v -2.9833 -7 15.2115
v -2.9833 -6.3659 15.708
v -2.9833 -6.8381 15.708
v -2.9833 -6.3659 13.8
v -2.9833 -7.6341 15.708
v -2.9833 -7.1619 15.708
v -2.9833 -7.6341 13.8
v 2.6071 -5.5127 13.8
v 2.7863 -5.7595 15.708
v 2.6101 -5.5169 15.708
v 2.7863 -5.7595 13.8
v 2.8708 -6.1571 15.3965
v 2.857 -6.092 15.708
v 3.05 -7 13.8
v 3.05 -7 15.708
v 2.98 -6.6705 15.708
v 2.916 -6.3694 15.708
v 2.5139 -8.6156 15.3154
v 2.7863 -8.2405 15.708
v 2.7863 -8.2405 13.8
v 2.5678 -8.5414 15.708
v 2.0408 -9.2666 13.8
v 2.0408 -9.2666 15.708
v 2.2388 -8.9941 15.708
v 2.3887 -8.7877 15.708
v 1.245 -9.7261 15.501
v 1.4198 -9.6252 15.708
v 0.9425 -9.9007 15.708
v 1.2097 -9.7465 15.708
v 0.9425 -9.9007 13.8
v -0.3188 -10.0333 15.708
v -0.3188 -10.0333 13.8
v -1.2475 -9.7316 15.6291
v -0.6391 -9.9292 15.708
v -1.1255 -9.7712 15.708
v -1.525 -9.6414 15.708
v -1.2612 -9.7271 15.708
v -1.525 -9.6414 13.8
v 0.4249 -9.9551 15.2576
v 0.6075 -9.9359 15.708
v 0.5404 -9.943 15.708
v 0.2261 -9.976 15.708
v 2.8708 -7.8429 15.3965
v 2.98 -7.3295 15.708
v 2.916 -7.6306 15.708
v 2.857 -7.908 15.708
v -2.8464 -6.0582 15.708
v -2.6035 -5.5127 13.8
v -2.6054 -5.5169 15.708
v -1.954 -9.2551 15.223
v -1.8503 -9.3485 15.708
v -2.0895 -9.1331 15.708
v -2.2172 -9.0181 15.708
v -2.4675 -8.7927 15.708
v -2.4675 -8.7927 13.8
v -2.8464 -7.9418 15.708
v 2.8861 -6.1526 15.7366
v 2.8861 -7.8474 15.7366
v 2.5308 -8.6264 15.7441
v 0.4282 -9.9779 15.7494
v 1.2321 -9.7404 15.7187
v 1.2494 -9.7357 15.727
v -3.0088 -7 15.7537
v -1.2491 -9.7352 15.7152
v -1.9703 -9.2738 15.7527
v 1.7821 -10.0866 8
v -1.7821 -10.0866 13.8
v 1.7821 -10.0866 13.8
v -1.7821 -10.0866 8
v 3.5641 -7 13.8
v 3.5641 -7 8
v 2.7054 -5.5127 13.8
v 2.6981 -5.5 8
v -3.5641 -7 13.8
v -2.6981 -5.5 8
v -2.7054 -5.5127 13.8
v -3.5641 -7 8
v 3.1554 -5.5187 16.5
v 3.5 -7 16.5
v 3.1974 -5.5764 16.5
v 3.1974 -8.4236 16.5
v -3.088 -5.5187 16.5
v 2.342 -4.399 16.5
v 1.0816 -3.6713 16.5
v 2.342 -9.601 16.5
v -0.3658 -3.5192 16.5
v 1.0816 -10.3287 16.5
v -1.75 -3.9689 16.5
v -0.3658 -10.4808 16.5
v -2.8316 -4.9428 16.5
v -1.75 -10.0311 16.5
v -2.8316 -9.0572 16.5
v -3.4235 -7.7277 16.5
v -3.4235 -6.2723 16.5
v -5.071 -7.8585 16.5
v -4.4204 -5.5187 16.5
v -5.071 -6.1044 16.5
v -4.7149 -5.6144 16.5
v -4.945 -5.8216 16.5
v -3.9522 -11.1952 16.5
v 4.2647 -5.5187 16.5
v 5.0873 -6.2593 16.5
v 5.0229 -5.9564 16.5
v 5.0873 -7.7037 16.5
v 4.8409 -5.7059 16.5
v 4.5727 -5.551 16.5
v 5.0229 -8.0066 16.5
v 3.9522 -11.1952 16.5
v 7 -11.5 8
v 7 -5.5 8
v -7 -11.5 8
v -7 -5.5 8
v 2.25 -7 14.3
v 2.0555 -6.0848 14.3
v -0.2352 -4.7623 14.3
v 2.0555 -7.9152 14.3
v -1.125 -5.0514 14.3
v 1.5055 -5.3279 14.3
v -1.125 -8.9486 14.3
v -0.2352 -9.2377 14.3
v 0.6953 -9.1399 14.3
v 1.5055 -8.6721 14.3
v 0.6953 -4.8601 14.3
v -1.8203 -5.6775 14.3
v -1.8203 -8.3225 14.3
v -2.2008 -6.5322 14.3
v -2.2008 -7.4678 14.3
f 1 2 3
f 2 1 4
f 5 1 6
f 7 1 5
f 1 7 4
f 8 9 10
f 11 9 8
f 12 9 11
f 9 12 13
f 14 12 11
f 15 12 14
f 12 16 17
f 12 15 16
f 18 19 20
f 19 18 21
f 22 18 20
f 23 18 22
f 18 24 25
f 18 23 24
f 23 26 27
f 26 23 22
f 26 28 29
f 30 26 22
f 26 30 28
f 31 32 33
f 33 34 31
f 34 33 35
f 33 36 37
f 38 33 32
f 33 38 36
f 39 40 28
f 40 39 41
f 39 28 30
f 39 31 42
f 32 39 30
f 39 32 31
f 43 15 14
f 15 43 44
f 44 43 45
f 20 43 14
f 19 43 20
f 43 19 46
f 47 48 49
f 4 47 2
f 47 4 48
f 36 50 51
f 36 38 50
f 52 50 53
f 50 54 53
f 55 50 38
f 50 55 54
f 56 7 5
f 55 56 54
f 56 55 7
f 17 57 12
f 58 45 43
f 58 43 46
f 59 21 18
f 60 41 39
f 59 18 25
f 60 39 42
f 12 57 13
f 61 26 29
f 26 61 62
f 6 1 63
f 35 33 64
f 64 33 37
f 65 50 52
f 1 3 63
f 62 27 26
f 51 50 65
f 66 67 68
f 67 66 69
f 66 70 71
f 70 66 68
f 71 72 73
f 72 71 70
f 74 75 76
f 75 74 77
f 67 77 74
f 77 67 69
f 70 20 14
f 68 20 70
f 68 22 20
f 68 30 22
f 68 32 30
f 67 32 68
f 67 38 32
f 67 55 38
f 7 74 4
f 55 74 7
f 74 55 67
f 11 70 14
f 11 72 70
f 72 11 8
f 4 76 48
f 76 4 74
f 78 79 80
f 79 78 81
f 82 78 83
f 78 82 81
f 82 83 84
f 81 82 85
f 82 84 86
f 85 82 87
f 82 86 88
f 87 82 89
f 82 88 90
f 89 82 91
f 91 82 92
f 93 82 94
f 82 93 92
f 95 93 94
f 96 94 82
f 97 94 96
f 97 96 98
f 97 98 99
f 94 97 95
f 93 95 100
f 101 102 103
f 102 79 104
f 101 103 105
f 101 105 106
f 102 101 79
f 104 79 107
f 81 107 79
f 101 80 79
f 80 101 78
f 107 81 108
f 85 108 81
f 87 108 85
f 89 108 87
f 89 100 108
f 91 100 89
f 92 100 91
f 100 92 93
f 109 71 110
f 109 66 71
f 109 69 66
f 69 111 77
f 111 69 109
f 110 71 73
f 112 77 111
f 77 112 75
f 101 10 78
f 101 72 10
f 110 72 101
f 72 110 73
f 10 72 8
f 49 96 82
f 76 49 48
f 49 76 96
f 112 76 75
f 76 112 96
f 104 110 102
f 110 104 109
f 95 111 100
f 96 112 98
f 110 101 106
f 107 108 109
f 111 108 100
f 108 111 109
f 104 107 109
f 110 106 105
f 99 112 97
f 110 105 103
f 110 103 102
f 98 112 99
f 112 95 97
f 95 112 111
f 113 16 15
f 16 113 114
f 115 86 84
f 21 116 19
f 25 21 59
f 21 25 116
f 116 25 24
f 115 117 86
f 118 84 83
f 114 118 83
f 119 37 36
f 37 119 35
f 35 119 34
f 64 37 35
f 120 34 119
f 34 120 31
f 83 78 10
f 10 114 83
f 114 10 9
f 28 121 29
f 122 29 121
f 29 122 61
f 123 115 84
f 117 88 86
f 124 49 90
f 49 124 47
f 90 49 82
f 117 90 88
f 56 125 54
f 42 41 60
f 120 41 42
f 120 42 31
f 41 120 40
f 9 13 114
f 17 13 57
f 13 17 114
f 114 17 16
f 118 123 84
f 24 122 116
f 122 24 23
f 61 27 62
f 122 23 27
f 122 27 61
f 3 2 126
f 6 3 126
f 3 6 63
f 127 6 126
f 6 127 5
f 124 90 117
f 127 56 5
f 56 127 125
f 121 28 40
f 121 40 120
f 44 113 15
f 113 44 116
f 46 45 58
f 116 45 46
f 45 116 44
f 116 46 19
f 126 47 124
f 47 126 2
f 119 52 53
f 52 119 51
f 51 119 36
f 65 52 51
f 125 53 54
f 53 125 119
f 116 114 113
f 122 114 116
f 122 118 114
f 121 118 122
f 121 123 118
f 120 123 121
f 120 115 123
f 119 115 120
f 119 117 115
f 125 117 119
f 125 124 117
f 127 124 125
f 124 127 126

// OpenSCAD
// file: util.scad
module pairX(d) for(a=[-d,d]) translate([a,0,0]) children();
module pairY(d) for(a=[-d,d]) translate([0,a,0]) children();
module pairZ(d) for(a=[-d,d]) translate([0,0,a]) children();

module mirrorX(d=0) { translate([d,0,0]) children();
    mirror([1,0,0])   translate([d,0,0]) children(); }
module mirrorY(d=0) { translate([0,d,0]) children();
    mirror([0,1,0])   translate([0,d,0]) children(); }
module mirrorZ(d=0) { translate([0,0,d]) children();
    mirror([0,0,1])   translate([0,0,d]) children(); }


//nanoSwitch();
NanoSwitchOffset = 1.8;  // center of switch to center of trigger
module nanoSwitch() { 
    difference () {
        translate([0,0,3.2]) cube([12.7,5.7,6.4],center=true); 
        #translate([0,0,5.7]) rotate([90,0,0])
            pairX(3) cylinder(d=2,h=8,$fn=16,center=true);
    }
    #for (d=[-5.25,0,5.25]) translate([d,0,6.3]) cube([.5,.5,4]);
    #translate([NanoSwitchOffset,0,-.5]) cube([1,2.8,1],center=true);
}
module fan40() difference() {
    hull() pairX(16) pairY(16) cylinder(r=4, h=10,$fn=36);
    translate([0,0,-1]) {
       pairX(16) pairY(16) cylinder(r=1.5,h=12,$fn=24);
    //pairX(16) pairY(16) cylinder(d=3,h=11,center=true,$fn=24);
       cylinder(d=38,h=12,$fn=48);
    }
}
module fan30() difference() {  // labeled 3007, but 8mm thick!
    translate([0,0,4]) cube([30,30,8],center=true);
    translate([0,0,-1]) {
       pairX(12) pairY(12) cylinder(r=1.5,h=12,$fn=24);
    //pairX(16) pairY(16) cylinder(d=3,h=11,center=true,$fn=24);
       cylinder(d=28,h=12,$fn=48);
    }
}
module fan3010() difference() {  // labeled 3007, but 8mm thick!
    translate([0,0,5]) cube([30,30,10],center=true);
    translate([0,0,-1]) {
       pairX(12) pairY(12) cylinder(r=1.5,h=12,$fn=24);
    //pairX(16) pairY(16) cylinder(d=3,h=11,center=true,$fn=24);
       cylinder(d=28,h=12,$fn=48);
    }
}

module fan30holes(r=1.5,h=40) translate([0,0,-1]) {
    #pairX(12) pairY(12) cylinder(r1=r+.15,r2=r-.2,h=h,$fn=24);
    cylinder(d=27,h=h,$fn=64);
    translate([0,0,-5]) cube([30,30,10],center=true);
}
module fan30mount(h=20) { %translate([0,0,-10]) fan3010();
    difference() {
        union() {
            for(a=[45:90:355]) rotate(a) translate([12*sqrt(2),0,0]) hull() {
                cylinder(r=4,h=4,$fn=RES/2);
                translate([-6,0,4]) cube([1,12,8],center=true);
            }
            cylinder(r=15,h=h,$fn=RES*1.5);
        }
        translate([0,0,3]) pairX(12) pairY(12) cylinder(d=5.5,h=6,$fn=RES/2);
        translate([0,0,-1]) {
            pairX(12) pairY(12) cylinder(r=1.6,h=12,$fn=RES/2);
            cylinder(d=27,h=h+2,$fn=RES*1.5);
        }
    } 
           
}
module fan40mount(h=20) { %translate([0,0,-10]) fan40();
    difference() {
        union() {
            for(a=[45:90:355]) rotate(a) translate([16*sqrt(2),0,0]) hull() {
                cylinder(r=4,h=4,$fn=RES/2);
                translate([-6,0,4]) cube([1,12,8],center=true);
            }
            cylinder(r=20,h=h,$fn=RES*1.5);
        }
        translate([0,0,3]) pairX(16) pairY(16) cylinder(d=5.5,h=6,$fn=RES/2);
        translate([0,0,-1]) {
            pairX(16) pairY(16) cylinder(r=1.6,h=12,$fn=RES/2);
            cylinder(d=37,h=h+2,$fn=RES*1.5);
        }
    } 
           
}

/* $Id$
$Log$
*/
// main file
// test/prototype for a kinematic mount, to be used to
// carry a hot-end/nozzle probe combo
RES=30;   // make larger for production  render

use <util.scad>;

PosSwitchMag = [0,-3.1,-0.2];

//%import("switchMount1.stl");
//%translate([0,-4.9,7.05]) import("switchMountRx1.stl");

%switchMount();  // true for proxy in glue jig

//magMountJig();

MagCenterY = -7;
MagZ = 11.5;
MountX = 14;
EffZ = 7;  // bottom of effector level

//translate([0,-MagCenterY,-4.5])
switchMountRx(true);  // true == proxy for glue jig

// mostly just for testing.  Production use, this
// assembly is added to effector, then at end
// holes are dirlled
module switchMountRx(proxy=false) difference() union() {
    difference() {
        switchMountRxBody();
        switchMountRxHoles();
            
        if (proxy) {
            // make top flat for possible clamp
            translate([-10,-15,16.5]) cube(20);
            // make sure bottom does not quite touch mount
            translate([-10,-15,-12]) cube(20);
        }
    }
        
    if (proxy) translate([0, MagCenterY,EffZ+7.3])
        cylinder(d1=4.5,d2=7,h=2.2,$fn=RES/2);
}

// flat area for clamp on mount
//difference() { translate([0,MagCenterY,2]) cube([16,16,5],center=true);  scale(1.02) #switchMount(); }

// plunger to mount magnet in effector
//union() { cylinder(d2=5.7,d1=5,h=11,$fn=RES); cylinder(r1=5,r2=2,$fn=6,h=4); }

// plug for when switch not in place
//translate([0,0,EffZ+1])
//difference() { cylinder(d1=6/cos(30),d2=6/cos(30)-.2,$fn=6,h=6);
//    translate([0,0,4]) cylinder(d=6,h=4,$fn=RES);
//    cylinder(d1=3.1,d2=2.8,h=8,$fn=16); }

module mountEdge() translate([0,-4.25,EffZ-1.25])
    pairX(MountX/2-1) sphere(d=2.5,$fn=RES/2);

module switchMount(proxy=false) { %nanoSwitch();
    difference() {
        union() {
            // magnet post
            translate([0,MagCenterY,EffZ-.1])
                cylinder(r=3/cos(30)-.05,h=4.8,$fn=6);
            
            if (proxy) {  // add proxy magnet for glue jig
                translate([0,MagCenterY,EffZ+4.5])
                    cylinder(d1=6,d2=5,h=4,$fn=RES/2);
            } else {
                // add a temporary alignment piece, to be removed
                // after magnet is glued in place
                difference() {
                    translate([0,MagCenterY,EffZ+4.6])
                        cylinder(d=8,h=2,$fn=6);
                    translate([-5,-5.7,8]) cube(10);
                }
            }
            
            //%translate([0,-8,3+1]) cube([MountX,10,6],center=true);
            //%translate([0,-4.25,8]) cube([MountX,2.5,10],center=true);
            hull() { mountEdge();
                translate([0,-4.25,EffZ+6])
                    pairX(MountX/2-2) sphere(d=2.5,$fn=RES/2);
            }
            hull() { mountEdge();
                translate([0,-12,EffZ-1])
                    pairX(MountX/2-2) sphere(1,$fn=RES/2);
                translate([0,-10,4])
                    pairX(MountX/2-3) sphere(2,$fn=RES/2);
                translate([0,-4.25,2])
                    pairX(6) sphere(1.25,$fn=RES/2);
            }

        }
        
        if (proxy) translate([-10,MagCenterY-8,-16])
            cube(20);   // chop off for flat bottom
        else {
            // clear out magnet zone
            #translate([0,MagCenterY,MagZ]) cylinder(d=6.2,h=3,$fn=RES/2);
        
            // M2 screw holes, self-tap
            translate([0,0,5.7]) pairX(3) rotate([90,0,0])
                cylinder(d1=2.2,d2=1.7,h=7,$fn=RES/2);
        }
    }
}

module switchMountRxBody(p=[0,0,0]) translate(p) hull() {
    translate([-MountX/2,-11.5,EffZ]) cube([MountX,6,1]);
    %translate([-3.5,-10.5,EffZ+11]) cube([7,5,1]);
    translate([0,-6.5,EffZ+12]) pairX(3.5) sphere(1,$fn=RES/2);
    translate([0,-11,EffZ+13.5]) cube([5,.1,.1],center=true);
}

module switchMountRxHoles(p=[0,0,0]) translate(p) {
    translate([0,MagCenterY,MagZ]) {
        // clear area including switch magnet
        cylinder(d=6.1,h=6.4,$fn=RES/2);
 
        // give magnet mount an inverse taper, so that any spread on the corner
        // is less likely to keep the magnet from seating properly
        #translate([0,0,3]) hull() {
            cylinder(d1=5.9,d2=6.2,h=3.2,$fn=22);
            cylinder(d=.1,h=3.8,$fn=6);  // flat ceiling hard to print
        }
    }
    
    translate([0,MagCenterY,6.8]) cylinder(d=0.2+ 6/cos(30),$fn=6,h=7);
}

//%translate([0,25,13]) rotate([180,0,0]) import("kinEffector.stl");
module magMountJig() difference() { rotate([90,0,0])
    cylinder(d=16.5,h=12,$fn=4,center=true);
    translate([0,0,-10]) cube(20,center=true);
    translate([0,0, 16.3]) cube(20,center=true);
    #translate([0,0,5.5]) mirrorX(3.4) rotate([0,45,0]) hull() {
                         cylinder(d=6.2,h=3,$fn=RES,center=true);
        translate([3,0]) cylinder(d=6.2,h=3,$fn=RES,center=true);}
}

/* $Id$
$Log$
*/
